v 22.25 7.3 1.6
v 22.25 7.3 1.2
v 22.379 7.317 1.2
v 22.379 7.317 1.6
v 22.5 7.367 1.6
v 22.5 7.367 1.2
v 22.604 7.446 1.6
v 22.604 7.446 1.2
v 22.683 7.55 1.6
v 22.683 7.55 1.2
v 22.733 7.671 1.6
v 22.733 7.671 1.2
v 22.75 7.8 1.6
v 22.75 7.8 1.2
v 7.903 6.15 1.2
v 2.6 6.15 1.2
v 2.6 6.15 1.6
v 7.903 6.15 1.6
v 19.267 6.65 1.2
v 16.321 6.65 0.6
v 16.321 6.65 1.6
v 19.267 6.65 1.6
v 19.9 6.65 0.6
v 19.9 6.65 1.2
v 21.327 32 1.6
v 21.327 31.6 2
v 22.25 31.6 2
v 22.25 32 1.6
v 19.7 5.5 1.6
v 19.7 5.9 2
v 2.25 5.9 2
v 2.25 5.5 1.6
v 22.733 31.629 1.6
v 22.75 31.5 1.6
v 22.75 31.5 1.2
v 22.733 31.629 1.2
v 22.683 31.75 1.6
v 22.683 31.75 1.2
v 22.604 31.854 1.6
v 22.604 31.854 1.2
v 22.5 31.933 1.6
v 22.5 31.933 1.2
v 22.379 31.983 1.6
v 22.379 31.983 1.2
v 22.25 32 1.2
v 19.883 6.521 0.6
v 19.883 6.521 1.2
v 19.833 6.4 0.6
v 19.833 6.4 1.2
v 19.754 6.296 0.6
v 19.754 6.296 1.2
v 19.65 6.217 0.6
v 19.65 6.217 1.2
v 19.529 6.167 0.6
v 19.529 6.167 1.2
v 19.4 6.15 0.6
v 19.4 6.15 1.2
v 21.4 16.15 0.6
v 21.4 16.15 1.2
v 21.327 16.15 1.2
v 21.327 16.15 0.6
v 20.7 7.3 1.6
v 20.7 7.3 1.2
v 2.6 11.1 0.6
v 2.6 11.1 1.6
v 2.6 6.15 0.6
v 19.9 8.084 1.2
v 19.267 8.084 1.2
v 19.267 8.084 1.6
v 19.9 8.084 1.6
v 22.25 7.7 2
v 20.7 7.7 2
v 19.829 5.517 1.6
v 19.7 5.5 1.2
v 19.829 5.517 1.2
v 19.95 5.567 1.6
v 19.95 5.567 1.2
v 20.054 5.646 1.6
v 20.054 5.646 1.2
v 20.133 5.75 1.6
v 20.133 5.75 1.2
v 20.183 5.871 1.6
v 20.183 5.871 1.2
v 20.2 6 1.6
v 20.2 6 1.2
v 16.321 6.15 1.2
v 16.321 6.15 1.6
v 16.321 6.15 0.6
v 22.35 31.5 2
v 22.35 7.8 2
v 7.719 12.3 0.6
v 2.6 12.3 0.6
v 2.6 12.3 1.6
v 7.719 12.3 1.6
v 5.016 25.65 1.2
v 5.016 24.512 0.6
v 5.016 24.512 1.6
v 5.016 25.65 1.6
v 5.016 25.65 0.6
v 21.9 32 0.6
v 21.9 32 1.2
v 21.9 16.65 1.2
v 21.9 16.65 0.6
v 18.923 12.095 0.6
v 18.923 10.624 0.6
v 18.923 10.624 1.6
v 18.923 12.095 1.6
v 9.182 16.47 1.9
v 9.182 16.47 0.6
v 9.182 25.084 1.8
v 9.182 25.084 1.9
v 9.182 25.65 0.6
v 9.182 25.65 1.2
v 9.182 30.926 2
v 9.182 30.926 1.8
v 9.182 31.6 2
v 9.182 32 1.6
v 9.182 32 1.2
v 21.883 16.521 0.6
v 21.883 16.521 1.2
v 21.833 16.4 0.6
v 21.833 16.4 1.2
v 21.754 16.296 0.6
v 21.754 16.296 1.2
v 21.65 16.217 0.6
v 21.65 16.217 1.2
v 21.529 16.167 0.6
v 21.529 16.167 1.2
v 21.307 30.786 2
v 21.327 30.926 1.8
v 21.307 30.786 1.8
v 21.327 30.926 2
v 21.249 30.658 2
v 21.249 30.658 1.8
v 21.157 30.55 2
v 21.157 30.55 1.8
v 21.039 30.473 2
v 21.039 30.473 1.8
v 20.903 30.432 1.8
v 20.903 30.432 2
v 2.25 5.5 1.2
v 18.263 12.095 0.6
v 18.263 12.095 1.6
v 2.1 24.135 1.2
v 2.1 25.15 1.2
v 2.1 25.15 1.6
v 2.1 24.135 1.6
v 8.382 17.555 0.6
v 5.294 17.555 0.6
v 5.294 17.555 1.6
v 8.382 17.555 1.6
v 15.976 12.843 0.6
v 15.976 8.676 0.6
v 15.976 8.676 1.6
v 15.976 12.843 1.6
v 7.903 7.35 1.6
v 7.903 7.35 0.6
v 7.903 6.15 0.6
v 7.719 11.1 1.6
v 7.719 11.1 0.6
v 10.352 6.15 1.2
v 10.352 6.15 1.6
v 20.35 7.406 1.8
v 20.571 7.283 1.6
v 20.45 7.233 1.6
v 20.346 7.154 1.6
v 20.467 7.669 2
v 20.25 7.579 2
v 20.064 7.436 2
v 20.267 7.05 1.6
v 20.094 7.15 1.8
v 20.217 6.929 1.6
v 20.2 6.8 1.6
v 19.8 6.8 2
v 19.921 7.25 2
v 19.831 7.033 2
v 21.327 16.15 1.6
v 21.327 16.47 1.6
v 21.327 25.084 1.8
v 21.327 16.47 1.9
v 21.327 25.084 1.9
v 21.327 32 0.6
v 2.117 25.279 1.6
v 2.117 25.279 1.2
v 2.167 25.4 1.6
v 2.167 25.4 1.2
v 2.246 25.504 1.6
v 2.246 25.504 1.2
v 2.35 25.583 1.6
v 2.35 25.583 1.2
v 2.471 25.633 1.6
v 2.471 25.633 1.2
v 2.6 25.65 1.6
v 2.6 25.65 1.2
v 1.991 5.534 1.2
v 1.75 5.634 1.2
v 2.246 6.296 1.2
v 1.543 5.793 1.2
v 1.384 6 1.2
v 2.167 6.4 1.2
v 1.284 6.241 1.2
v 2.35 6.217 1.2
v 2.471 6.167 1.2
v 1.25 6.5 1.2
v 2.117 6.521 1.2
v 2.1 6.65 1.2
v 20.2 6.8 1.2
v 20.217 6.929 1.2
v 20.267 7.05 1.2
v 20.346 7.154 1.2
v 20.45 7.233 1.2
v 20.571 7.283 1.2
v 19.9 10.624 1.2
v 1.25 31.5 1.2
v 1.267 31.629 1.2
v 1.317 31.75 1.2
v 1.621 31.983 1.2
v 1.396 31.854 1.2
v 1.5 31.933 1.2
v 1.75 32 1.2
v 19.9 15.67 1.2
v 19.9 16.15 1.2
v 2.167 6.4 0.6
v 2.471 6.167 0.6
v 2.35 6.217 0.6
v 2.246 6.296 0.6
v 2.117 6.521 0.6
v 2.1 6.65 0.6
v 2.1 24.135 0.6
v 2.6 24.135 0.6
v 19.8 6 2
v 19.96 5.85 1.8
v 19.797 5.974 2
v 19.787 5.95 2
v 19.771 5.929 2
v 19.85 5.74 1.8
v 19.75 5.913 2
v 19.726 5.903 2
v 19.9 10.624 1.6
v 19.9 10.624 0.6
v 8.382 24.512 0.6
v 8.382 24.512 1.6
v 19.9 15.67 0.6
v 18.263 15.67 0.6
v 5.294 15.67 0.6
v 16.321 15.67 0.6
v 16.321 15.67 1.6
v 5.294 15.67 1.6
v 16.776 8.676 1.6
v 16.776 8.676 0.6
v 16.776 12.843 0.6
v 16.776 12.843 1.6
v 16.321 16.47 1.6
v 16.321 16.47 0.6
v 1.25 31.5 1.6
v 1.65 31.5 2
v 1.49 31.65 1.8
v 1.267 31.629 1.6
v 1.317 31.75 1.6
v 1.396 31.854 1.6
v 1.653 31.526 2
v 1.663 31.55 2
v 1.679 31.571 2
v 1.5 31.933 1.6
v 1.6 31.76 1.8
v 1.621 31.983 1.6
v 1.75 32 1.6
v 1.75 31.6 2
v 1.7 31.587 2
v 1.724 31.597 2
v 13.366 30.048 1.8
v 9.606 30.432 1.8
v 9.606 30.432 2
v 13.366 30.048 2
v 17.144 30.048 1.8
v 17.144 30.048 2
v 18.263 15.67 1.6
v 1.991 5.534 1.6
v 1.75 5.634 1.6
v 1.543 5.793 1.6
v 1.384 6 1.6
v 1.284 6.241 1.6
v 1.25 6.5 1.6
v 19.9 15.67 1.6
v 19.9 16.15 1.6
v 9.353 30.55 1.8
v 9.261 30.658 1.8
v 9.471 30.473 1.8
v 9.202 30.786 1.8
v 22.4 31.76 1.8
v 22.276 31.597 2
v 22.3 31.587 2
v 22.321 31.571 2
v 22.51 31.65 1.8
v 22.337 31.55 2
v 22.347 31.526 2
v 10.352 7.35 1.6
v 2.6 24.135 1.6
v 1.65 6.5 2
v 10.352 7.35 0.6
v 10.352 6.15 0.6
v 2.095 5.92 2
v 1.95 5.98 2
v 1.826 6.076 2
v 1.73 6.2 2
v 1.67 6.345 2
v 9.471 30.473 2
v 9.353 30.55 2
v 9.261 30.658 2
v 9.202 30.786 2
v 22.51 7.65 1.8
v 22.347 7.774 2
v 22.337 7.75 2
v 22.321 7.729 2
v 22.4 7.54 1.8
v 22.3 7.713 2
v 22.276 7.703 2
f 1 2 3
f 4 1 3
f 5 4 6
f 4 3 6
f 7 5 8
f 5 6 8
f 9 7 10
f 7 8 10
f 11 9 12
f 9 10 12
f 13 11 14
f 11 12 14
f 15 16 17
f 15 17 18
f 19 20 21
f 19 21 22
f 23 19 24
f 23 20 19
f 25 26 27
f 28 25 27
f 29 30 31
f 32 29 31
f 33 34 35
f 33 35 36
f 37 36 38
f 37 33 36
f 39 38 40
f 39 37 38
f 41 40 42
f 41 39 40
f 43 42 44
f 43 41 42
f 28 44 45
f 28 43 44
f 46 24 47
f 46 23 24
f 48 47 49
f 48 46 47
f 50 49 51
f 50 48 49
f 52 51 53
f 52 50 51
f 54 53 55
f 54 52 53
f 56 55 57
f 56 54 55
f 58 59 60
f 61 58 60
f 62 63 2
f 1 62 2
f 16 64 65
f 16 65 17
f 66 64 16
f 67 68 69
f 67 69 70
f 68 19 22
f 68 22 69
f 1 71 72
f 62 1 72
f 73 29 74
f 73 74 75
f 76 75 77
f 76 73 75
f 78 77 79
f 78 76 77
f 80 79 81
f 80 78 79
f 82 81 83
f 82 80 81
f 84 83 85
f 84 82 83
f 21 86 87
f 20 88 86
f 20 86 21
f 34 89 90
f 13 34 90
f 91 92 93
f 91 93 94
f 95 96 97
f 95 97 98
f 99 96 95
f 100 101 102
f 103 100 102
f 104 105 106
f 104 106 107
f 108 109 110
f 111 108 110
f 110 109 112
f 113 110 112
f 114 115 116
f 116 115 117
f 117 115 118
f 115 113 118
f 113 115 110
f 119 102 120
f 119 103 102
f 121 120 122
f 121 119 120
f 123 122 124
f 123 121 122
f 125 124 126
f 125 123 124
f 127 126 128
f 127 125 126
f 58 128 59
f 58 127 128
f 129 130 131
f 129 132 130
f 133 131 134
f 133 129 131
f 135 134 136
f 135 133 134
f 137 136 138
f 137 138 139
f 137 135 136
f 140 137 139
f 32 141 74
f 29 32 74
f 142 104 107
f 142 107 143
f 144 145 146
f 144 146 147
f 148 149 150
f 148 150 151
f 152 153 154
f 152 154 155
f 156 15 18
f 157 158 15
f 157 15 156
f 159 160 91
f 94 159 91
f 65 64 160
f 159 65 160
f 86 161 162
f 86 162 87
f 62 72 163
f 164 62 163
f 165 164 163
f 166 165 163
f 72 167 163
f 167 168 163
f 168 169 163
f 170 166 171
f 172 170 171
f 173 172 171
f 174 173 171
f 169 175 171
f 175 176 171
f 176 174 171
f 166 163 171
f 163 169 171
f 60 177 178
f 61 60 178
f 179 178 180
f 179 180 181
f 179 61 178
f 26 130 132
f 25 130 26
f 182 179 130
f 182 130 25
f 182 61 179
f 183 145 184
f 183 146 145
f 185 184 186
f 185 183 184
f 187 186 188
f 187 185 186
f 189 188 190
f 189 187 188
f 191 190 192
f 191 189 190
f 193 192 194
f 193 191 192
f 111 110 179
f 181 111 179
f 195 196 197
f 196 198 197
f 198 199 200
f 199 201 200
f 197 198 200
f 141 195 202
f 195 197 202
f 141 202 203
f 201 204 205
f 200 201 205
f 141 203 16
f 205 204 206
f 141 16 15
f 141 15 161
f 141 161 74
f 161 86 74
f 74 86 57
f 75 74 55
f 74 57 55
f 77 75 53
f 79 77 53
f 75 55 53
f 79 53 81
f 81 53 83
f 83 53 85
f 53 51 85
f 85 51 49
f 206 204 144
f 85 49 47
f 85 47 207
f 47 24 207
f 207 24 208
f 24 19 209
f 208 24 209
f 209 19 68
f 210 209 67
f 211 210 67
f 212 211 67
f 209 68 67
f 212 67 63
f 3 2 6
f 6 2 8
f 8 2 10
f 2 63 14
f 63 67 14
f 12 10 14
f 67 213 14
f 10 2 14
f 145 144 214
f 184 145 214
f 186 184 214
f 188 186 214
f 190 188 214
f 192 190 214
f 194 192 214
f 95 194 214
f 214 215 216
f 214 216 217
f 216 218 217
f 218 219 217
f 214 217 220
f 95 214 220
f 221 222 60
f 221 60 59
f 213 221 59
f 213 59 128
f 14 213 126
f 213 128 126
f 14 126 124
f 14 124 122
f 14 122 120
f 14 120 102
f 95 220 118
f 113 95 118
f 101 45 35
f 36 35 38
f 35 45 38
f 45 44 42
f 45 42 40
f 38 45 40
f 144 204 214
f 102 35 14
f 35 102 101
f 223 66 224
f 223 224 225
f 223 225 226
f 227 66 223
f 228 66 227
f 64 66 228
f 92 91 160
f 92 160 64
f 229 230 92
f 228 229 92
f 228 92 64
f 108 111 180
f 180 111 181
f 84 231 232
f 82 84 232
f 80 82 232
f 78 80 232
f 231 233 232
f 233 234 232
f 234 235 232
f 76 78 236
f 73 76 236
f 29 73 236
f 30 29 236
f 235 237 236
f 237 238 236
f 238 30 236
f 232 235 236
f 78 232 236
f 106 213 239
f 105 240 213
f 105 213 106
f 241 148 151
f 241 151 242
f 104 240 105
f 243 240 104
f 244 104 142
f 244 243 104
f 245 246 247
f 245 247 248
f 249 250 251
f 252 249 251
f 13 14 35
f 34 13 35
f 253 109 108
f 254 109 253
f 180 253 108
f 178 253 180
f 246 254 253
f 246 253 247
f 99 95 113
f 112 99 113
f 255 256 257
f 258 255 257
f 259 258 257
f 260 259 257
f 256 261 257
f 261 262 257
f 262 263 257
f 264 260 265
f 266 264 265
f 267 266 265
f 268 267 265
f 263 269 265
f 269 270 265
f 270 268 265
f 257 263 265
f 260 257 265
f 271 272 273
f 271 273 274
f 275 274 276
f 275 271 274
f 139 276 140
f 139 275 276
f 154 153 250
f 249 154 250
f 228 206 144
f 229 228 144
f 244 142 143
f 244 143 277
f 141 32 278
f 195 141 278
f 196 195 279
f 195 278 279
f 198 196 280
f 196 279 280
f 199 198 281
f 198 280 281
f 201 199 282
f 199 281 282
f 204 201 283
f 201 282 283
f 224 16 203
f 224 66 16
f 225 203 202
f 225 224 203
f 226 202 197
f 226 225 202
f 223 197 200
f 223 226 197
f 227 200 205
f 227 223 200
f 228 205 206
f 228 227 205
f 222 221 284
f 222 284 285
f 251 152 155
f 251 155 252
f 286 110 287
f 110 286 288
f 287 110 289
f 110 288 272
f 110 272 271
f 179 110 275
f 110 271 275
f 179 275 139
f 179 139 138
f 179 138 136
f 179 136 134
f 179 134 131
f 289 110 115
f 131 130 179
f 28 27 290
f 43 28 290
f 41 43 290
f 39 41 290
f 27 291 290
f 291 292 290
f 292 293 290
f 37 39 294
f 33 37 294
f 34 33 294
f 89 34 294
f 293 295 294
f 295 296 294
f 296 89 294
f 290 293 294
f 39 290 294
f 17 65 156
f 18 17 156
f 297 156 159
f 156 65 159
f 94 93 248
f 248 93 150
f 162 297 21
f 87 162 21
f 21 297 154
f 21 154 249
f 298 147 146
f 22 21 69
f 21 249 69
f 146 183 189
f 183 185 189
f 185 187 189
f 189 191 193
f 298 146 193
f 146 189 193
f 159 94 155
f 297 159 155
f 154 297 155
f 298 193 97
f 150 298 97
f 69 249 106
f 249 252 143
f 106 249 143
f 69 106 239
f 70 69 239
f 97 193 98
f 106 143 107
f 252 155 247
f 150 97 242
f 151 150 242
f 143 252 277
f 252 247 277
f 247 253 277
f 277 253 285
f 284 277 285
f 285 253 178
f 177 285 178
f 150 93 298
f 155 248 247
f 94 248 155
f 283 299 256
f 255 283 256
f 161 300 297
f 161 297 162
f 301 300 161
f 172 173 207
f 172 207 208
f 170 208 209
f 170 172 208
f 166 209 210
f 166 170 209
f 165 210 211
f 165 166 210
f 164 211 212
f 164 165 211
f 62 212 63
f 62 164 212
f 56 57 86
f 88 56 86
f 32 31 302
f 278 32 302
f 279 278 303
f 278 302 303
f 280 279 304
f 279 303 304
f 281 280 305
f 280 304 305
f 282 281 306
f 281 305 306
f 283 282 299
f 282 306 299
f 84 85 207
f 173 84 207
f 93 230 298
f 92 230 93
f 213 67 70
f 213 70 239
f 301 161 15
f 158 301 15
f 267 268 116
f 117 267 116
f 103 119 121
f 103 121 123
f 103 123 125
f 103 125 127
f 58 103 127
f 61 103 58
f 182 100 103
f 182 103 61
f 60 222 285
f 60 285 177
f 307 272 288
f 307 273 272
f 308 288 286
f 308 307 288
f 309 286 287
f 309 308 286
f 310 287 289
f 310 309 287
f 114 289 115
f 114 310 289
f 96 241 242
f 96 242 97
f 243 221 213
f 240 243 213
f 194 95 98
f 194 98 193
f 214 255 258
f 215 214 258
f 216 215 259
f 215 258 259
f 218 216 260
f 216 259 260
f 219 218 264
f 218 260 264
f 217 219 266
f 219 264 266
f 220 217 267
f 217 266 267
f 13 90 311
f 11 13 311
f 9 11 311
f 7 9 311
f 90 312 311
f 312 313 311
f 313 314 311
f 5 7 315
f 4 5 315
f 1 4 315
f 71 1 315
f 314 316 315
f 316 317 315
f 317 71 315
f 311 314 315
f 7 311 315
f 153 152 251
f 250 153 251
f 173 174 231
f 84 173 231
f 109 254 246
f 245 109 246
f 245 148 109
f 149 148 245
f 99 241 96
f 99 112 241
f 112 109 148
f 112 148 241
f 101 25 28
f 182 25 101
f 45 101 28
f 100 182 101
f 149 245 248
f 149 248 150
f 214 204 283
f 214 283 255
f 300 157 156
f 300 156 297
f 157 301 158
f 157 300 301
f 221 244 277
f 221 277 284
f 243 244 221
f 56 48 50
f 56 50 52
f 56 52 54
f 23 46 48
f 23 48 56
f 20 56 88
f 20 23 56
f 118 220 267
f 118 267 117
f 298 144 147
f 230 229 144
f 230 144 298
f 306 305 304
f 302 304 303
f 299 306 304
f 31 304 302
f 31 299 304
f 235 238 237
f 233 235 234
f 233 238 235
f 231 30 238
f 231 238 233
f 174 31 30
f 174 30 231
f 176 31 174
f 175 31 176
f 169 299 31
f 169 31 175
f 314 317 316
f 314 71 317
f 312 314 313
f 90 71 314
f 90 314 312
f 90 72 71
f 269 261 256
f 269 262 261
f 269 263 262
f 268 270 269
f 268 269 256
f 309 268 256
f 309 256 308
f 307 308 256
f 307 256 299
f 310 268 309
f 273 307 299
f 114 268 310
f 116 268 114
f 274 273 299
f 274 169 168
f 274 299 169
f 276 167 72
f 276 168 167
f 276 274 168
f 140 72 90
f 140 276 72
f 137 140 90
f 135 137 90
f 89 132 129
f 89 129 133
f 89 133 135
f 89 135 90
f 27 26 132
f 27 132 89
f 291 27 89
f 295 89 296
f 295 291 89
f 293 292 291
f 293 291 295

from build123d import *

# Parameters (mm, degrees)
SKIZZE2_W                                   = 21.5
SKIZZE2_H                                   = 26.5
AUFSATZ_LINEAR_AUSTRAGEN1_DEPTH             = 0.8
AUFSATZ_LINEAR_AUSTRAGEN2_DEPTH             = 0.6
SCHNITT_LINEAR_AUSTRAGEN2_DEPTH             = 0.7
SCHNITT_LINEAR_AUSTRAGEN2_DEPTH_BACK        = 40.270886163
SKIZZE5_W                                   = 12.144981168
SKIZZE5_H                                   = 8.613973721
SCHNITT_LINEAR_AUSTRAGEN1_DEPTH             = 0.4
SCHNITT_LINEAR_AUSTRAGEN1_DEPTH_BACK        = 40.270886163
SCHNITT_LINEAR_AUSTRAGEN3_DEPTH             = 0.6
SCHNITT_LINEAR_AUSTRAGEN3_DEPTH_BACK        = 40.270886163
SKIZZE6_W                                   = 12.144981168
SKIZZE6_H                                   = 8.023619308
VERRUNDUNG1_R                               = 0.5
SCHNITT_LINEAR_AUSTRAGEN4_DEPTH             = 40.270886163
SCHNITT_LINEAR_AUSTRAGEN4_DEPTH_BACK        = 40.270886163
VERRUNDUNG3_R                               = 0.5
SKIZZE8_W                                   = 5.461913831
SKIZZE8_H                                   = 1.2
SKIZZE8_W_2                                 = 0.8
SKIZZE8_H_2                                 = 4.167109648
AUFSATZ_LINEAR_AUSTRAGEN3_DEPTH             = 0.6
AUFSATZ_LINEAR_AUSTRAGEN3_DIRECTION_2_REACH = 41.271
SCHNITT_LINEAR_AUSTRAGEN5_DEPTH             = 40.270886163
SCHNITT_LINEAR_AUSTRAGEN5_DEPTH_BACK        = 40.270886163
SKIZZE9_W                                   = 2.954983754
SKIZZE9_H                                   = 2.164950306
SKIZZE10_W                                  = 0.770433568
SKIZZE10_H                                  = 2.170677495
AUFSATZ_LINEAR_AUSTRAGEN4_DEPTH             = 0.8
VERRUNDUNG2_R                               = 1
VERRUNDUNG4_R                               = 0.5
FASE1_SIZE                                  = 0.4


with BuildPart() as part:
    # Skizze2 → Aufsatz-Linear austragen1 (new body)
    with BuildSketch(Plane.XY.offset(1.2)):
        with Locations((12, 18.75)):
            Rectangle(SKIZZE2_W, SKIZZE2_H)
    extrude(amount=AUFSATZ_LINEAR_AUSTRAGEN1_DEPTH)

    # Skizze3 → Aufsatz-Linear austragen2 (add)
    with BuildSketch(Plane.XY.offset(1.2)):
        Polygon((21.9, 32), (21.9, 16.15), (19.9, 16.15), (19.9, 6.15), (2.1, 6.15), (2.1, 25.65), (10, 25.65), (10, 32), align=None)
    extrude(amount=-AUFSATZ_LINEAR_AUSTRAGEN2_DEPTH)

    # Skizze5 → Schnitt-Linear austragen2 (cut, two sides: drawn at the far end of the back side and taken through both)
    with BuildSketch(Plane.XY.offset(1.2).offset(-SCHNITT_LINEAR_AUSTRAGEN2_DEPTH_BACK)):
        with Locations((15.254893919, 20.77736777)):
            Rectangle(SKIZZE5_W, SKIZZE5_H)
    extrude(amount=SCHNITT_LINEAR_AUSTRAGEN2_DEPTH + SCHNITT_LINEAR_AUSTRAGEN2_DEPTH_BACK, mode=Mode.SUBTRACT)

    # Skizze4 → Schnitt-Linear austragen1 (cut, two sides: drawn at the far end of the back side and taken through both)
    with BuildSketch(Plane.XY.offset(1.2).offset(-SCHNITT_LINEAR_AUSTRAGEN1_DEPTH_BACK)):
        Polygon((8.382403335, 24.511668734), (5.015709698, 24.511668734), (5.015709698, 25.65), (2.1, 25.65), (2.1, 24.134887808), (2.6, 24.134887808), (2.6, 6.15), (7.902667193, 6.15), (7.902667193, 7.35), (10.352191741, 7.35), (10.352191741, 6.15), (16.321024544, 6.15), (16.321024544, 6.65), (19.9, 6.65), (19.9, 10.624393956), (18.922805677, 10.624393956), (18.922805677, 12.094523693), (18.263327803, 12.094523693), (18.263327803, 15.67038091), (19.9, 15.67038091), (19.9, 16.15), (21.327384503, 16.15), (21.327384503, 16.47038091), (16.321024544, 16.47038091), (16.321024544, 15.67038091), (5.294026876, 15.67038091), (5.294026876, 17.554984477), (8.382403335, 17.554984477), align=None)
    extrude(amount=SCHNITT_LINEAR_AUSTRAGEN1_DEPTH + SCHNITT_LINEAR_AUSTRAGEN1_DEPTH_BACK, mode=Mode.SUBTRACT)

    # Skizze6 → Schnitt-Linear austragen3 (cut, two sides: drawn at the far end of the back side and taken through both)
    with BuildSketch(Plane.XY.offset(1.2).offset(-SCHNITT_LINEAR_AUSTRAGEN3_DEPTH_BACK)):
        with Locations((15.254893919, 29.096164285)):
            Rectangle(SKIZZE6_W, SKIZZE6_H)
    extrude(amount=SCHNITT_LINEAR_AUSTRAGEN3_DEPTH + SCHNITT_LINEAR_AUSTRAGEN3_DEPTH_BACK, mode=Mode.SUBTRACT)

    # Verrundung1
    verrundung1_edges = [part.edges().sort_by_distance(p)[0] for p in [
        (21.9, 16.15, 0.9),
        (2.1, 25.65, 1.4),
        (2.1, 6.15, 0.9),
        (19.9, 6.15, 0.9),
    ]]
    fillet(verrundung1_edges, radius=VERRUNDUNG1_R - 0.0001)  # a hair under: the kernel refuses the full size

    # Skizze7 → Schnitt-Linear austragen4 (cut, two sides: drawn at the far end of the back side and taken through both)
    with BuildSketch(Plane.XY.offset(1.2).offset(-SCHNITT_LINEAR_AUSTRAGEN4_DEPTH_BACK)):
        with BuildLine():
            Line((21.327384503, 30.5), (21.327384503, 32.799881912))
            Line((21.327384503, 32.799881912), (9.182403335, 32.799881912))
            Line((9.182403335, 32.799881912), (9.182403335, 30.5))
            ThreePointArc((9.182403335, 30.5), (15.254893919, 30), (21.327384503, 30.5))
        make_face()
    extrude(amount=SCHNITT_LINEAR_AUSTRAGEN4_DEPTH + SCHNITT_LINEAR_AUSTRAGEN4_DEPTH_BACK, mode=Mode.SUBTRACT)

    # Verrundung3
    verrundung3_edges = [part.edges().sort_by_distance(p)[0] for p in [
        (9.182403335, 30.5, 1.9),
        (21.327384503, 30.5, 1.9),
    ]]
    fillet(verrundung3_edges, radius=VERRUNDUNG3_R)

    # Skizze8 → Aufsatz-Linear austragen3 (add)
    with BuildSketch(Plane.XY.offset(1.2)):
        with Locations((4.988422265, 11.700335539)):
            Rectangle(SKIZZE8_W, SKIZZE8_H)
        with Locations((16.376411907, 10.759758473)):
            Rectangle(SKIZZE8_W_2, SKIZZE8_H_2)
    extrude(amount=-AUFSATZ_LINEAR_AUSTRAGEN3_DEPTH)

    # Skizze8 → Aufsatz-Linear austragen3 direction 2 (add, up to next)
    with BuildSketch(Plane.XY.offset(1.2), mode=Mode.PRIVATE) as aufsatz_linear_austragen3_direction_2_sk1:
        with Locations((4.988422265, 11.700335539)):
            Rectangle(SKIZZE8_W, SKIZZE8_H)
    aufsatz_linear_austragen3_direction_2_tool1 = extrude(aufsatz_linear_austragen3_direction_2_sk1.sketch, amount=AUFSATZ_LINEAR_AUSTRAGEN3_DIRECTION_2_REACH, mode=Mode.PRIVATE) - part.part
    # Skizze8 → Aufsatz-Linear austragen3 direction 2 (add, up to next)
    with BuildSketch(Plane.XY.offset(1.2), mode=Mode.PRIVATE) as aufsatz_linear_austragen3_direction_2_sk2:
        with Locations((16.376411907, 10.759758473)):
            Rectangle(SKIZZE8_W_2, SKIZZE8_H_2)
    aufsatz_linear_austragen3_direction_2_tool2 = extrude(aufsatz_linear_austragen3_direction_2_sk2.sketch, amount=AUFSATZ_LINEAR_AUSTRAGEN3_DIRECTION_2_REACH, mode=Mode.PRIVATE) - part.part
    add(aufsatz_linear_austragen3_direction_2_tool1.solids().sort_by_distance((4.988422, 11.700336, 1.2))[0])
    add(aufsatz_linear_austragen3_direction_2_tool2.solids().sort_by_distance((16.376412, 10.759758, 1.2))[0])

    # Skizze9 → Schnitt-Linear austragen5 (cut, two sides: drawn at the far end of the back side and taken through both)
    with BuildSketch(Plane.XY.offset(1.2).offset(-SCHNITT_LINEAR_AUSTRAGEN5_DEPTH_BACK)):
        with Locations((21.677491877, 6.217524847)):
            Rectangle(SKIZZE9_W, SKIZZE9_H)
    extrude(amount=SCHNITT_LINEAR_AUSTRAGEN5_DEPTH + SCHNITT_LINEAR_AUSTRAGEN5_DEPTH_BACK, mode=Mode.SUBTRACT)

    # Skizze10 → Aufsatz-Linear austragen4 (add)
    with BuildSketch(Plane.XY.offset(1.2)):
        with Locations((19.652022519, 6.998720979)):
            Rectangle(SKIZZE10_W, SKIZZE10_H)
    extrude(amount=AUFSATZ_LINEAR_AUSTRAGEN4_DEPTH)

    # Verrundung2
    verrundung2_edges = [part.edges().sort_by_distance(p)[0] for p in [
        (1.25, 5.5, 1.6),
    ]]
    fillet(verrundung2_edges, radius=VERRUNDUNG2_R)

    # Verrundung4
    verrundung4_edges = [part.edges().sort_by_distance(p)[0] for p in [
        (22.75, 7.3, 1.6),
        (20.2, 5.5, 1.6),
        (20.2, 7.3, 1.6),
        (1.25, 32, 1.6),
        (22.75, 32, 1.6),
    ]]
    fillet(verrundung4_edges, radius=VERRUNDUNG4_R)

    # Fase1
    fase1_edges = [part.edges().sort_by_distance(p)[0] for p in [
        (5.466201668, 32, 2),
        (10.975, 5.5, 2),
        (1.542893219, 5.792893219, 2),
        (22.75, 19.65, 2),
        (21.475, 7.3, 2),
        (1.25, 19, 2),
        (20.2, 6.4, 2),
        (21.788692251, 32, 2),
        (1.396446609, 31.853553391, 2),
        (22.603553391, 31.853553391, 2),
        (20.053553391, 5.646446609, 2),
        (22.603553391, 7.446446609, 2),
        (20.346446609, 7.153553391, 2),
    ]]
    chamfer(fase1_edges, length=FASE1_SIZE)


solid = part.part
